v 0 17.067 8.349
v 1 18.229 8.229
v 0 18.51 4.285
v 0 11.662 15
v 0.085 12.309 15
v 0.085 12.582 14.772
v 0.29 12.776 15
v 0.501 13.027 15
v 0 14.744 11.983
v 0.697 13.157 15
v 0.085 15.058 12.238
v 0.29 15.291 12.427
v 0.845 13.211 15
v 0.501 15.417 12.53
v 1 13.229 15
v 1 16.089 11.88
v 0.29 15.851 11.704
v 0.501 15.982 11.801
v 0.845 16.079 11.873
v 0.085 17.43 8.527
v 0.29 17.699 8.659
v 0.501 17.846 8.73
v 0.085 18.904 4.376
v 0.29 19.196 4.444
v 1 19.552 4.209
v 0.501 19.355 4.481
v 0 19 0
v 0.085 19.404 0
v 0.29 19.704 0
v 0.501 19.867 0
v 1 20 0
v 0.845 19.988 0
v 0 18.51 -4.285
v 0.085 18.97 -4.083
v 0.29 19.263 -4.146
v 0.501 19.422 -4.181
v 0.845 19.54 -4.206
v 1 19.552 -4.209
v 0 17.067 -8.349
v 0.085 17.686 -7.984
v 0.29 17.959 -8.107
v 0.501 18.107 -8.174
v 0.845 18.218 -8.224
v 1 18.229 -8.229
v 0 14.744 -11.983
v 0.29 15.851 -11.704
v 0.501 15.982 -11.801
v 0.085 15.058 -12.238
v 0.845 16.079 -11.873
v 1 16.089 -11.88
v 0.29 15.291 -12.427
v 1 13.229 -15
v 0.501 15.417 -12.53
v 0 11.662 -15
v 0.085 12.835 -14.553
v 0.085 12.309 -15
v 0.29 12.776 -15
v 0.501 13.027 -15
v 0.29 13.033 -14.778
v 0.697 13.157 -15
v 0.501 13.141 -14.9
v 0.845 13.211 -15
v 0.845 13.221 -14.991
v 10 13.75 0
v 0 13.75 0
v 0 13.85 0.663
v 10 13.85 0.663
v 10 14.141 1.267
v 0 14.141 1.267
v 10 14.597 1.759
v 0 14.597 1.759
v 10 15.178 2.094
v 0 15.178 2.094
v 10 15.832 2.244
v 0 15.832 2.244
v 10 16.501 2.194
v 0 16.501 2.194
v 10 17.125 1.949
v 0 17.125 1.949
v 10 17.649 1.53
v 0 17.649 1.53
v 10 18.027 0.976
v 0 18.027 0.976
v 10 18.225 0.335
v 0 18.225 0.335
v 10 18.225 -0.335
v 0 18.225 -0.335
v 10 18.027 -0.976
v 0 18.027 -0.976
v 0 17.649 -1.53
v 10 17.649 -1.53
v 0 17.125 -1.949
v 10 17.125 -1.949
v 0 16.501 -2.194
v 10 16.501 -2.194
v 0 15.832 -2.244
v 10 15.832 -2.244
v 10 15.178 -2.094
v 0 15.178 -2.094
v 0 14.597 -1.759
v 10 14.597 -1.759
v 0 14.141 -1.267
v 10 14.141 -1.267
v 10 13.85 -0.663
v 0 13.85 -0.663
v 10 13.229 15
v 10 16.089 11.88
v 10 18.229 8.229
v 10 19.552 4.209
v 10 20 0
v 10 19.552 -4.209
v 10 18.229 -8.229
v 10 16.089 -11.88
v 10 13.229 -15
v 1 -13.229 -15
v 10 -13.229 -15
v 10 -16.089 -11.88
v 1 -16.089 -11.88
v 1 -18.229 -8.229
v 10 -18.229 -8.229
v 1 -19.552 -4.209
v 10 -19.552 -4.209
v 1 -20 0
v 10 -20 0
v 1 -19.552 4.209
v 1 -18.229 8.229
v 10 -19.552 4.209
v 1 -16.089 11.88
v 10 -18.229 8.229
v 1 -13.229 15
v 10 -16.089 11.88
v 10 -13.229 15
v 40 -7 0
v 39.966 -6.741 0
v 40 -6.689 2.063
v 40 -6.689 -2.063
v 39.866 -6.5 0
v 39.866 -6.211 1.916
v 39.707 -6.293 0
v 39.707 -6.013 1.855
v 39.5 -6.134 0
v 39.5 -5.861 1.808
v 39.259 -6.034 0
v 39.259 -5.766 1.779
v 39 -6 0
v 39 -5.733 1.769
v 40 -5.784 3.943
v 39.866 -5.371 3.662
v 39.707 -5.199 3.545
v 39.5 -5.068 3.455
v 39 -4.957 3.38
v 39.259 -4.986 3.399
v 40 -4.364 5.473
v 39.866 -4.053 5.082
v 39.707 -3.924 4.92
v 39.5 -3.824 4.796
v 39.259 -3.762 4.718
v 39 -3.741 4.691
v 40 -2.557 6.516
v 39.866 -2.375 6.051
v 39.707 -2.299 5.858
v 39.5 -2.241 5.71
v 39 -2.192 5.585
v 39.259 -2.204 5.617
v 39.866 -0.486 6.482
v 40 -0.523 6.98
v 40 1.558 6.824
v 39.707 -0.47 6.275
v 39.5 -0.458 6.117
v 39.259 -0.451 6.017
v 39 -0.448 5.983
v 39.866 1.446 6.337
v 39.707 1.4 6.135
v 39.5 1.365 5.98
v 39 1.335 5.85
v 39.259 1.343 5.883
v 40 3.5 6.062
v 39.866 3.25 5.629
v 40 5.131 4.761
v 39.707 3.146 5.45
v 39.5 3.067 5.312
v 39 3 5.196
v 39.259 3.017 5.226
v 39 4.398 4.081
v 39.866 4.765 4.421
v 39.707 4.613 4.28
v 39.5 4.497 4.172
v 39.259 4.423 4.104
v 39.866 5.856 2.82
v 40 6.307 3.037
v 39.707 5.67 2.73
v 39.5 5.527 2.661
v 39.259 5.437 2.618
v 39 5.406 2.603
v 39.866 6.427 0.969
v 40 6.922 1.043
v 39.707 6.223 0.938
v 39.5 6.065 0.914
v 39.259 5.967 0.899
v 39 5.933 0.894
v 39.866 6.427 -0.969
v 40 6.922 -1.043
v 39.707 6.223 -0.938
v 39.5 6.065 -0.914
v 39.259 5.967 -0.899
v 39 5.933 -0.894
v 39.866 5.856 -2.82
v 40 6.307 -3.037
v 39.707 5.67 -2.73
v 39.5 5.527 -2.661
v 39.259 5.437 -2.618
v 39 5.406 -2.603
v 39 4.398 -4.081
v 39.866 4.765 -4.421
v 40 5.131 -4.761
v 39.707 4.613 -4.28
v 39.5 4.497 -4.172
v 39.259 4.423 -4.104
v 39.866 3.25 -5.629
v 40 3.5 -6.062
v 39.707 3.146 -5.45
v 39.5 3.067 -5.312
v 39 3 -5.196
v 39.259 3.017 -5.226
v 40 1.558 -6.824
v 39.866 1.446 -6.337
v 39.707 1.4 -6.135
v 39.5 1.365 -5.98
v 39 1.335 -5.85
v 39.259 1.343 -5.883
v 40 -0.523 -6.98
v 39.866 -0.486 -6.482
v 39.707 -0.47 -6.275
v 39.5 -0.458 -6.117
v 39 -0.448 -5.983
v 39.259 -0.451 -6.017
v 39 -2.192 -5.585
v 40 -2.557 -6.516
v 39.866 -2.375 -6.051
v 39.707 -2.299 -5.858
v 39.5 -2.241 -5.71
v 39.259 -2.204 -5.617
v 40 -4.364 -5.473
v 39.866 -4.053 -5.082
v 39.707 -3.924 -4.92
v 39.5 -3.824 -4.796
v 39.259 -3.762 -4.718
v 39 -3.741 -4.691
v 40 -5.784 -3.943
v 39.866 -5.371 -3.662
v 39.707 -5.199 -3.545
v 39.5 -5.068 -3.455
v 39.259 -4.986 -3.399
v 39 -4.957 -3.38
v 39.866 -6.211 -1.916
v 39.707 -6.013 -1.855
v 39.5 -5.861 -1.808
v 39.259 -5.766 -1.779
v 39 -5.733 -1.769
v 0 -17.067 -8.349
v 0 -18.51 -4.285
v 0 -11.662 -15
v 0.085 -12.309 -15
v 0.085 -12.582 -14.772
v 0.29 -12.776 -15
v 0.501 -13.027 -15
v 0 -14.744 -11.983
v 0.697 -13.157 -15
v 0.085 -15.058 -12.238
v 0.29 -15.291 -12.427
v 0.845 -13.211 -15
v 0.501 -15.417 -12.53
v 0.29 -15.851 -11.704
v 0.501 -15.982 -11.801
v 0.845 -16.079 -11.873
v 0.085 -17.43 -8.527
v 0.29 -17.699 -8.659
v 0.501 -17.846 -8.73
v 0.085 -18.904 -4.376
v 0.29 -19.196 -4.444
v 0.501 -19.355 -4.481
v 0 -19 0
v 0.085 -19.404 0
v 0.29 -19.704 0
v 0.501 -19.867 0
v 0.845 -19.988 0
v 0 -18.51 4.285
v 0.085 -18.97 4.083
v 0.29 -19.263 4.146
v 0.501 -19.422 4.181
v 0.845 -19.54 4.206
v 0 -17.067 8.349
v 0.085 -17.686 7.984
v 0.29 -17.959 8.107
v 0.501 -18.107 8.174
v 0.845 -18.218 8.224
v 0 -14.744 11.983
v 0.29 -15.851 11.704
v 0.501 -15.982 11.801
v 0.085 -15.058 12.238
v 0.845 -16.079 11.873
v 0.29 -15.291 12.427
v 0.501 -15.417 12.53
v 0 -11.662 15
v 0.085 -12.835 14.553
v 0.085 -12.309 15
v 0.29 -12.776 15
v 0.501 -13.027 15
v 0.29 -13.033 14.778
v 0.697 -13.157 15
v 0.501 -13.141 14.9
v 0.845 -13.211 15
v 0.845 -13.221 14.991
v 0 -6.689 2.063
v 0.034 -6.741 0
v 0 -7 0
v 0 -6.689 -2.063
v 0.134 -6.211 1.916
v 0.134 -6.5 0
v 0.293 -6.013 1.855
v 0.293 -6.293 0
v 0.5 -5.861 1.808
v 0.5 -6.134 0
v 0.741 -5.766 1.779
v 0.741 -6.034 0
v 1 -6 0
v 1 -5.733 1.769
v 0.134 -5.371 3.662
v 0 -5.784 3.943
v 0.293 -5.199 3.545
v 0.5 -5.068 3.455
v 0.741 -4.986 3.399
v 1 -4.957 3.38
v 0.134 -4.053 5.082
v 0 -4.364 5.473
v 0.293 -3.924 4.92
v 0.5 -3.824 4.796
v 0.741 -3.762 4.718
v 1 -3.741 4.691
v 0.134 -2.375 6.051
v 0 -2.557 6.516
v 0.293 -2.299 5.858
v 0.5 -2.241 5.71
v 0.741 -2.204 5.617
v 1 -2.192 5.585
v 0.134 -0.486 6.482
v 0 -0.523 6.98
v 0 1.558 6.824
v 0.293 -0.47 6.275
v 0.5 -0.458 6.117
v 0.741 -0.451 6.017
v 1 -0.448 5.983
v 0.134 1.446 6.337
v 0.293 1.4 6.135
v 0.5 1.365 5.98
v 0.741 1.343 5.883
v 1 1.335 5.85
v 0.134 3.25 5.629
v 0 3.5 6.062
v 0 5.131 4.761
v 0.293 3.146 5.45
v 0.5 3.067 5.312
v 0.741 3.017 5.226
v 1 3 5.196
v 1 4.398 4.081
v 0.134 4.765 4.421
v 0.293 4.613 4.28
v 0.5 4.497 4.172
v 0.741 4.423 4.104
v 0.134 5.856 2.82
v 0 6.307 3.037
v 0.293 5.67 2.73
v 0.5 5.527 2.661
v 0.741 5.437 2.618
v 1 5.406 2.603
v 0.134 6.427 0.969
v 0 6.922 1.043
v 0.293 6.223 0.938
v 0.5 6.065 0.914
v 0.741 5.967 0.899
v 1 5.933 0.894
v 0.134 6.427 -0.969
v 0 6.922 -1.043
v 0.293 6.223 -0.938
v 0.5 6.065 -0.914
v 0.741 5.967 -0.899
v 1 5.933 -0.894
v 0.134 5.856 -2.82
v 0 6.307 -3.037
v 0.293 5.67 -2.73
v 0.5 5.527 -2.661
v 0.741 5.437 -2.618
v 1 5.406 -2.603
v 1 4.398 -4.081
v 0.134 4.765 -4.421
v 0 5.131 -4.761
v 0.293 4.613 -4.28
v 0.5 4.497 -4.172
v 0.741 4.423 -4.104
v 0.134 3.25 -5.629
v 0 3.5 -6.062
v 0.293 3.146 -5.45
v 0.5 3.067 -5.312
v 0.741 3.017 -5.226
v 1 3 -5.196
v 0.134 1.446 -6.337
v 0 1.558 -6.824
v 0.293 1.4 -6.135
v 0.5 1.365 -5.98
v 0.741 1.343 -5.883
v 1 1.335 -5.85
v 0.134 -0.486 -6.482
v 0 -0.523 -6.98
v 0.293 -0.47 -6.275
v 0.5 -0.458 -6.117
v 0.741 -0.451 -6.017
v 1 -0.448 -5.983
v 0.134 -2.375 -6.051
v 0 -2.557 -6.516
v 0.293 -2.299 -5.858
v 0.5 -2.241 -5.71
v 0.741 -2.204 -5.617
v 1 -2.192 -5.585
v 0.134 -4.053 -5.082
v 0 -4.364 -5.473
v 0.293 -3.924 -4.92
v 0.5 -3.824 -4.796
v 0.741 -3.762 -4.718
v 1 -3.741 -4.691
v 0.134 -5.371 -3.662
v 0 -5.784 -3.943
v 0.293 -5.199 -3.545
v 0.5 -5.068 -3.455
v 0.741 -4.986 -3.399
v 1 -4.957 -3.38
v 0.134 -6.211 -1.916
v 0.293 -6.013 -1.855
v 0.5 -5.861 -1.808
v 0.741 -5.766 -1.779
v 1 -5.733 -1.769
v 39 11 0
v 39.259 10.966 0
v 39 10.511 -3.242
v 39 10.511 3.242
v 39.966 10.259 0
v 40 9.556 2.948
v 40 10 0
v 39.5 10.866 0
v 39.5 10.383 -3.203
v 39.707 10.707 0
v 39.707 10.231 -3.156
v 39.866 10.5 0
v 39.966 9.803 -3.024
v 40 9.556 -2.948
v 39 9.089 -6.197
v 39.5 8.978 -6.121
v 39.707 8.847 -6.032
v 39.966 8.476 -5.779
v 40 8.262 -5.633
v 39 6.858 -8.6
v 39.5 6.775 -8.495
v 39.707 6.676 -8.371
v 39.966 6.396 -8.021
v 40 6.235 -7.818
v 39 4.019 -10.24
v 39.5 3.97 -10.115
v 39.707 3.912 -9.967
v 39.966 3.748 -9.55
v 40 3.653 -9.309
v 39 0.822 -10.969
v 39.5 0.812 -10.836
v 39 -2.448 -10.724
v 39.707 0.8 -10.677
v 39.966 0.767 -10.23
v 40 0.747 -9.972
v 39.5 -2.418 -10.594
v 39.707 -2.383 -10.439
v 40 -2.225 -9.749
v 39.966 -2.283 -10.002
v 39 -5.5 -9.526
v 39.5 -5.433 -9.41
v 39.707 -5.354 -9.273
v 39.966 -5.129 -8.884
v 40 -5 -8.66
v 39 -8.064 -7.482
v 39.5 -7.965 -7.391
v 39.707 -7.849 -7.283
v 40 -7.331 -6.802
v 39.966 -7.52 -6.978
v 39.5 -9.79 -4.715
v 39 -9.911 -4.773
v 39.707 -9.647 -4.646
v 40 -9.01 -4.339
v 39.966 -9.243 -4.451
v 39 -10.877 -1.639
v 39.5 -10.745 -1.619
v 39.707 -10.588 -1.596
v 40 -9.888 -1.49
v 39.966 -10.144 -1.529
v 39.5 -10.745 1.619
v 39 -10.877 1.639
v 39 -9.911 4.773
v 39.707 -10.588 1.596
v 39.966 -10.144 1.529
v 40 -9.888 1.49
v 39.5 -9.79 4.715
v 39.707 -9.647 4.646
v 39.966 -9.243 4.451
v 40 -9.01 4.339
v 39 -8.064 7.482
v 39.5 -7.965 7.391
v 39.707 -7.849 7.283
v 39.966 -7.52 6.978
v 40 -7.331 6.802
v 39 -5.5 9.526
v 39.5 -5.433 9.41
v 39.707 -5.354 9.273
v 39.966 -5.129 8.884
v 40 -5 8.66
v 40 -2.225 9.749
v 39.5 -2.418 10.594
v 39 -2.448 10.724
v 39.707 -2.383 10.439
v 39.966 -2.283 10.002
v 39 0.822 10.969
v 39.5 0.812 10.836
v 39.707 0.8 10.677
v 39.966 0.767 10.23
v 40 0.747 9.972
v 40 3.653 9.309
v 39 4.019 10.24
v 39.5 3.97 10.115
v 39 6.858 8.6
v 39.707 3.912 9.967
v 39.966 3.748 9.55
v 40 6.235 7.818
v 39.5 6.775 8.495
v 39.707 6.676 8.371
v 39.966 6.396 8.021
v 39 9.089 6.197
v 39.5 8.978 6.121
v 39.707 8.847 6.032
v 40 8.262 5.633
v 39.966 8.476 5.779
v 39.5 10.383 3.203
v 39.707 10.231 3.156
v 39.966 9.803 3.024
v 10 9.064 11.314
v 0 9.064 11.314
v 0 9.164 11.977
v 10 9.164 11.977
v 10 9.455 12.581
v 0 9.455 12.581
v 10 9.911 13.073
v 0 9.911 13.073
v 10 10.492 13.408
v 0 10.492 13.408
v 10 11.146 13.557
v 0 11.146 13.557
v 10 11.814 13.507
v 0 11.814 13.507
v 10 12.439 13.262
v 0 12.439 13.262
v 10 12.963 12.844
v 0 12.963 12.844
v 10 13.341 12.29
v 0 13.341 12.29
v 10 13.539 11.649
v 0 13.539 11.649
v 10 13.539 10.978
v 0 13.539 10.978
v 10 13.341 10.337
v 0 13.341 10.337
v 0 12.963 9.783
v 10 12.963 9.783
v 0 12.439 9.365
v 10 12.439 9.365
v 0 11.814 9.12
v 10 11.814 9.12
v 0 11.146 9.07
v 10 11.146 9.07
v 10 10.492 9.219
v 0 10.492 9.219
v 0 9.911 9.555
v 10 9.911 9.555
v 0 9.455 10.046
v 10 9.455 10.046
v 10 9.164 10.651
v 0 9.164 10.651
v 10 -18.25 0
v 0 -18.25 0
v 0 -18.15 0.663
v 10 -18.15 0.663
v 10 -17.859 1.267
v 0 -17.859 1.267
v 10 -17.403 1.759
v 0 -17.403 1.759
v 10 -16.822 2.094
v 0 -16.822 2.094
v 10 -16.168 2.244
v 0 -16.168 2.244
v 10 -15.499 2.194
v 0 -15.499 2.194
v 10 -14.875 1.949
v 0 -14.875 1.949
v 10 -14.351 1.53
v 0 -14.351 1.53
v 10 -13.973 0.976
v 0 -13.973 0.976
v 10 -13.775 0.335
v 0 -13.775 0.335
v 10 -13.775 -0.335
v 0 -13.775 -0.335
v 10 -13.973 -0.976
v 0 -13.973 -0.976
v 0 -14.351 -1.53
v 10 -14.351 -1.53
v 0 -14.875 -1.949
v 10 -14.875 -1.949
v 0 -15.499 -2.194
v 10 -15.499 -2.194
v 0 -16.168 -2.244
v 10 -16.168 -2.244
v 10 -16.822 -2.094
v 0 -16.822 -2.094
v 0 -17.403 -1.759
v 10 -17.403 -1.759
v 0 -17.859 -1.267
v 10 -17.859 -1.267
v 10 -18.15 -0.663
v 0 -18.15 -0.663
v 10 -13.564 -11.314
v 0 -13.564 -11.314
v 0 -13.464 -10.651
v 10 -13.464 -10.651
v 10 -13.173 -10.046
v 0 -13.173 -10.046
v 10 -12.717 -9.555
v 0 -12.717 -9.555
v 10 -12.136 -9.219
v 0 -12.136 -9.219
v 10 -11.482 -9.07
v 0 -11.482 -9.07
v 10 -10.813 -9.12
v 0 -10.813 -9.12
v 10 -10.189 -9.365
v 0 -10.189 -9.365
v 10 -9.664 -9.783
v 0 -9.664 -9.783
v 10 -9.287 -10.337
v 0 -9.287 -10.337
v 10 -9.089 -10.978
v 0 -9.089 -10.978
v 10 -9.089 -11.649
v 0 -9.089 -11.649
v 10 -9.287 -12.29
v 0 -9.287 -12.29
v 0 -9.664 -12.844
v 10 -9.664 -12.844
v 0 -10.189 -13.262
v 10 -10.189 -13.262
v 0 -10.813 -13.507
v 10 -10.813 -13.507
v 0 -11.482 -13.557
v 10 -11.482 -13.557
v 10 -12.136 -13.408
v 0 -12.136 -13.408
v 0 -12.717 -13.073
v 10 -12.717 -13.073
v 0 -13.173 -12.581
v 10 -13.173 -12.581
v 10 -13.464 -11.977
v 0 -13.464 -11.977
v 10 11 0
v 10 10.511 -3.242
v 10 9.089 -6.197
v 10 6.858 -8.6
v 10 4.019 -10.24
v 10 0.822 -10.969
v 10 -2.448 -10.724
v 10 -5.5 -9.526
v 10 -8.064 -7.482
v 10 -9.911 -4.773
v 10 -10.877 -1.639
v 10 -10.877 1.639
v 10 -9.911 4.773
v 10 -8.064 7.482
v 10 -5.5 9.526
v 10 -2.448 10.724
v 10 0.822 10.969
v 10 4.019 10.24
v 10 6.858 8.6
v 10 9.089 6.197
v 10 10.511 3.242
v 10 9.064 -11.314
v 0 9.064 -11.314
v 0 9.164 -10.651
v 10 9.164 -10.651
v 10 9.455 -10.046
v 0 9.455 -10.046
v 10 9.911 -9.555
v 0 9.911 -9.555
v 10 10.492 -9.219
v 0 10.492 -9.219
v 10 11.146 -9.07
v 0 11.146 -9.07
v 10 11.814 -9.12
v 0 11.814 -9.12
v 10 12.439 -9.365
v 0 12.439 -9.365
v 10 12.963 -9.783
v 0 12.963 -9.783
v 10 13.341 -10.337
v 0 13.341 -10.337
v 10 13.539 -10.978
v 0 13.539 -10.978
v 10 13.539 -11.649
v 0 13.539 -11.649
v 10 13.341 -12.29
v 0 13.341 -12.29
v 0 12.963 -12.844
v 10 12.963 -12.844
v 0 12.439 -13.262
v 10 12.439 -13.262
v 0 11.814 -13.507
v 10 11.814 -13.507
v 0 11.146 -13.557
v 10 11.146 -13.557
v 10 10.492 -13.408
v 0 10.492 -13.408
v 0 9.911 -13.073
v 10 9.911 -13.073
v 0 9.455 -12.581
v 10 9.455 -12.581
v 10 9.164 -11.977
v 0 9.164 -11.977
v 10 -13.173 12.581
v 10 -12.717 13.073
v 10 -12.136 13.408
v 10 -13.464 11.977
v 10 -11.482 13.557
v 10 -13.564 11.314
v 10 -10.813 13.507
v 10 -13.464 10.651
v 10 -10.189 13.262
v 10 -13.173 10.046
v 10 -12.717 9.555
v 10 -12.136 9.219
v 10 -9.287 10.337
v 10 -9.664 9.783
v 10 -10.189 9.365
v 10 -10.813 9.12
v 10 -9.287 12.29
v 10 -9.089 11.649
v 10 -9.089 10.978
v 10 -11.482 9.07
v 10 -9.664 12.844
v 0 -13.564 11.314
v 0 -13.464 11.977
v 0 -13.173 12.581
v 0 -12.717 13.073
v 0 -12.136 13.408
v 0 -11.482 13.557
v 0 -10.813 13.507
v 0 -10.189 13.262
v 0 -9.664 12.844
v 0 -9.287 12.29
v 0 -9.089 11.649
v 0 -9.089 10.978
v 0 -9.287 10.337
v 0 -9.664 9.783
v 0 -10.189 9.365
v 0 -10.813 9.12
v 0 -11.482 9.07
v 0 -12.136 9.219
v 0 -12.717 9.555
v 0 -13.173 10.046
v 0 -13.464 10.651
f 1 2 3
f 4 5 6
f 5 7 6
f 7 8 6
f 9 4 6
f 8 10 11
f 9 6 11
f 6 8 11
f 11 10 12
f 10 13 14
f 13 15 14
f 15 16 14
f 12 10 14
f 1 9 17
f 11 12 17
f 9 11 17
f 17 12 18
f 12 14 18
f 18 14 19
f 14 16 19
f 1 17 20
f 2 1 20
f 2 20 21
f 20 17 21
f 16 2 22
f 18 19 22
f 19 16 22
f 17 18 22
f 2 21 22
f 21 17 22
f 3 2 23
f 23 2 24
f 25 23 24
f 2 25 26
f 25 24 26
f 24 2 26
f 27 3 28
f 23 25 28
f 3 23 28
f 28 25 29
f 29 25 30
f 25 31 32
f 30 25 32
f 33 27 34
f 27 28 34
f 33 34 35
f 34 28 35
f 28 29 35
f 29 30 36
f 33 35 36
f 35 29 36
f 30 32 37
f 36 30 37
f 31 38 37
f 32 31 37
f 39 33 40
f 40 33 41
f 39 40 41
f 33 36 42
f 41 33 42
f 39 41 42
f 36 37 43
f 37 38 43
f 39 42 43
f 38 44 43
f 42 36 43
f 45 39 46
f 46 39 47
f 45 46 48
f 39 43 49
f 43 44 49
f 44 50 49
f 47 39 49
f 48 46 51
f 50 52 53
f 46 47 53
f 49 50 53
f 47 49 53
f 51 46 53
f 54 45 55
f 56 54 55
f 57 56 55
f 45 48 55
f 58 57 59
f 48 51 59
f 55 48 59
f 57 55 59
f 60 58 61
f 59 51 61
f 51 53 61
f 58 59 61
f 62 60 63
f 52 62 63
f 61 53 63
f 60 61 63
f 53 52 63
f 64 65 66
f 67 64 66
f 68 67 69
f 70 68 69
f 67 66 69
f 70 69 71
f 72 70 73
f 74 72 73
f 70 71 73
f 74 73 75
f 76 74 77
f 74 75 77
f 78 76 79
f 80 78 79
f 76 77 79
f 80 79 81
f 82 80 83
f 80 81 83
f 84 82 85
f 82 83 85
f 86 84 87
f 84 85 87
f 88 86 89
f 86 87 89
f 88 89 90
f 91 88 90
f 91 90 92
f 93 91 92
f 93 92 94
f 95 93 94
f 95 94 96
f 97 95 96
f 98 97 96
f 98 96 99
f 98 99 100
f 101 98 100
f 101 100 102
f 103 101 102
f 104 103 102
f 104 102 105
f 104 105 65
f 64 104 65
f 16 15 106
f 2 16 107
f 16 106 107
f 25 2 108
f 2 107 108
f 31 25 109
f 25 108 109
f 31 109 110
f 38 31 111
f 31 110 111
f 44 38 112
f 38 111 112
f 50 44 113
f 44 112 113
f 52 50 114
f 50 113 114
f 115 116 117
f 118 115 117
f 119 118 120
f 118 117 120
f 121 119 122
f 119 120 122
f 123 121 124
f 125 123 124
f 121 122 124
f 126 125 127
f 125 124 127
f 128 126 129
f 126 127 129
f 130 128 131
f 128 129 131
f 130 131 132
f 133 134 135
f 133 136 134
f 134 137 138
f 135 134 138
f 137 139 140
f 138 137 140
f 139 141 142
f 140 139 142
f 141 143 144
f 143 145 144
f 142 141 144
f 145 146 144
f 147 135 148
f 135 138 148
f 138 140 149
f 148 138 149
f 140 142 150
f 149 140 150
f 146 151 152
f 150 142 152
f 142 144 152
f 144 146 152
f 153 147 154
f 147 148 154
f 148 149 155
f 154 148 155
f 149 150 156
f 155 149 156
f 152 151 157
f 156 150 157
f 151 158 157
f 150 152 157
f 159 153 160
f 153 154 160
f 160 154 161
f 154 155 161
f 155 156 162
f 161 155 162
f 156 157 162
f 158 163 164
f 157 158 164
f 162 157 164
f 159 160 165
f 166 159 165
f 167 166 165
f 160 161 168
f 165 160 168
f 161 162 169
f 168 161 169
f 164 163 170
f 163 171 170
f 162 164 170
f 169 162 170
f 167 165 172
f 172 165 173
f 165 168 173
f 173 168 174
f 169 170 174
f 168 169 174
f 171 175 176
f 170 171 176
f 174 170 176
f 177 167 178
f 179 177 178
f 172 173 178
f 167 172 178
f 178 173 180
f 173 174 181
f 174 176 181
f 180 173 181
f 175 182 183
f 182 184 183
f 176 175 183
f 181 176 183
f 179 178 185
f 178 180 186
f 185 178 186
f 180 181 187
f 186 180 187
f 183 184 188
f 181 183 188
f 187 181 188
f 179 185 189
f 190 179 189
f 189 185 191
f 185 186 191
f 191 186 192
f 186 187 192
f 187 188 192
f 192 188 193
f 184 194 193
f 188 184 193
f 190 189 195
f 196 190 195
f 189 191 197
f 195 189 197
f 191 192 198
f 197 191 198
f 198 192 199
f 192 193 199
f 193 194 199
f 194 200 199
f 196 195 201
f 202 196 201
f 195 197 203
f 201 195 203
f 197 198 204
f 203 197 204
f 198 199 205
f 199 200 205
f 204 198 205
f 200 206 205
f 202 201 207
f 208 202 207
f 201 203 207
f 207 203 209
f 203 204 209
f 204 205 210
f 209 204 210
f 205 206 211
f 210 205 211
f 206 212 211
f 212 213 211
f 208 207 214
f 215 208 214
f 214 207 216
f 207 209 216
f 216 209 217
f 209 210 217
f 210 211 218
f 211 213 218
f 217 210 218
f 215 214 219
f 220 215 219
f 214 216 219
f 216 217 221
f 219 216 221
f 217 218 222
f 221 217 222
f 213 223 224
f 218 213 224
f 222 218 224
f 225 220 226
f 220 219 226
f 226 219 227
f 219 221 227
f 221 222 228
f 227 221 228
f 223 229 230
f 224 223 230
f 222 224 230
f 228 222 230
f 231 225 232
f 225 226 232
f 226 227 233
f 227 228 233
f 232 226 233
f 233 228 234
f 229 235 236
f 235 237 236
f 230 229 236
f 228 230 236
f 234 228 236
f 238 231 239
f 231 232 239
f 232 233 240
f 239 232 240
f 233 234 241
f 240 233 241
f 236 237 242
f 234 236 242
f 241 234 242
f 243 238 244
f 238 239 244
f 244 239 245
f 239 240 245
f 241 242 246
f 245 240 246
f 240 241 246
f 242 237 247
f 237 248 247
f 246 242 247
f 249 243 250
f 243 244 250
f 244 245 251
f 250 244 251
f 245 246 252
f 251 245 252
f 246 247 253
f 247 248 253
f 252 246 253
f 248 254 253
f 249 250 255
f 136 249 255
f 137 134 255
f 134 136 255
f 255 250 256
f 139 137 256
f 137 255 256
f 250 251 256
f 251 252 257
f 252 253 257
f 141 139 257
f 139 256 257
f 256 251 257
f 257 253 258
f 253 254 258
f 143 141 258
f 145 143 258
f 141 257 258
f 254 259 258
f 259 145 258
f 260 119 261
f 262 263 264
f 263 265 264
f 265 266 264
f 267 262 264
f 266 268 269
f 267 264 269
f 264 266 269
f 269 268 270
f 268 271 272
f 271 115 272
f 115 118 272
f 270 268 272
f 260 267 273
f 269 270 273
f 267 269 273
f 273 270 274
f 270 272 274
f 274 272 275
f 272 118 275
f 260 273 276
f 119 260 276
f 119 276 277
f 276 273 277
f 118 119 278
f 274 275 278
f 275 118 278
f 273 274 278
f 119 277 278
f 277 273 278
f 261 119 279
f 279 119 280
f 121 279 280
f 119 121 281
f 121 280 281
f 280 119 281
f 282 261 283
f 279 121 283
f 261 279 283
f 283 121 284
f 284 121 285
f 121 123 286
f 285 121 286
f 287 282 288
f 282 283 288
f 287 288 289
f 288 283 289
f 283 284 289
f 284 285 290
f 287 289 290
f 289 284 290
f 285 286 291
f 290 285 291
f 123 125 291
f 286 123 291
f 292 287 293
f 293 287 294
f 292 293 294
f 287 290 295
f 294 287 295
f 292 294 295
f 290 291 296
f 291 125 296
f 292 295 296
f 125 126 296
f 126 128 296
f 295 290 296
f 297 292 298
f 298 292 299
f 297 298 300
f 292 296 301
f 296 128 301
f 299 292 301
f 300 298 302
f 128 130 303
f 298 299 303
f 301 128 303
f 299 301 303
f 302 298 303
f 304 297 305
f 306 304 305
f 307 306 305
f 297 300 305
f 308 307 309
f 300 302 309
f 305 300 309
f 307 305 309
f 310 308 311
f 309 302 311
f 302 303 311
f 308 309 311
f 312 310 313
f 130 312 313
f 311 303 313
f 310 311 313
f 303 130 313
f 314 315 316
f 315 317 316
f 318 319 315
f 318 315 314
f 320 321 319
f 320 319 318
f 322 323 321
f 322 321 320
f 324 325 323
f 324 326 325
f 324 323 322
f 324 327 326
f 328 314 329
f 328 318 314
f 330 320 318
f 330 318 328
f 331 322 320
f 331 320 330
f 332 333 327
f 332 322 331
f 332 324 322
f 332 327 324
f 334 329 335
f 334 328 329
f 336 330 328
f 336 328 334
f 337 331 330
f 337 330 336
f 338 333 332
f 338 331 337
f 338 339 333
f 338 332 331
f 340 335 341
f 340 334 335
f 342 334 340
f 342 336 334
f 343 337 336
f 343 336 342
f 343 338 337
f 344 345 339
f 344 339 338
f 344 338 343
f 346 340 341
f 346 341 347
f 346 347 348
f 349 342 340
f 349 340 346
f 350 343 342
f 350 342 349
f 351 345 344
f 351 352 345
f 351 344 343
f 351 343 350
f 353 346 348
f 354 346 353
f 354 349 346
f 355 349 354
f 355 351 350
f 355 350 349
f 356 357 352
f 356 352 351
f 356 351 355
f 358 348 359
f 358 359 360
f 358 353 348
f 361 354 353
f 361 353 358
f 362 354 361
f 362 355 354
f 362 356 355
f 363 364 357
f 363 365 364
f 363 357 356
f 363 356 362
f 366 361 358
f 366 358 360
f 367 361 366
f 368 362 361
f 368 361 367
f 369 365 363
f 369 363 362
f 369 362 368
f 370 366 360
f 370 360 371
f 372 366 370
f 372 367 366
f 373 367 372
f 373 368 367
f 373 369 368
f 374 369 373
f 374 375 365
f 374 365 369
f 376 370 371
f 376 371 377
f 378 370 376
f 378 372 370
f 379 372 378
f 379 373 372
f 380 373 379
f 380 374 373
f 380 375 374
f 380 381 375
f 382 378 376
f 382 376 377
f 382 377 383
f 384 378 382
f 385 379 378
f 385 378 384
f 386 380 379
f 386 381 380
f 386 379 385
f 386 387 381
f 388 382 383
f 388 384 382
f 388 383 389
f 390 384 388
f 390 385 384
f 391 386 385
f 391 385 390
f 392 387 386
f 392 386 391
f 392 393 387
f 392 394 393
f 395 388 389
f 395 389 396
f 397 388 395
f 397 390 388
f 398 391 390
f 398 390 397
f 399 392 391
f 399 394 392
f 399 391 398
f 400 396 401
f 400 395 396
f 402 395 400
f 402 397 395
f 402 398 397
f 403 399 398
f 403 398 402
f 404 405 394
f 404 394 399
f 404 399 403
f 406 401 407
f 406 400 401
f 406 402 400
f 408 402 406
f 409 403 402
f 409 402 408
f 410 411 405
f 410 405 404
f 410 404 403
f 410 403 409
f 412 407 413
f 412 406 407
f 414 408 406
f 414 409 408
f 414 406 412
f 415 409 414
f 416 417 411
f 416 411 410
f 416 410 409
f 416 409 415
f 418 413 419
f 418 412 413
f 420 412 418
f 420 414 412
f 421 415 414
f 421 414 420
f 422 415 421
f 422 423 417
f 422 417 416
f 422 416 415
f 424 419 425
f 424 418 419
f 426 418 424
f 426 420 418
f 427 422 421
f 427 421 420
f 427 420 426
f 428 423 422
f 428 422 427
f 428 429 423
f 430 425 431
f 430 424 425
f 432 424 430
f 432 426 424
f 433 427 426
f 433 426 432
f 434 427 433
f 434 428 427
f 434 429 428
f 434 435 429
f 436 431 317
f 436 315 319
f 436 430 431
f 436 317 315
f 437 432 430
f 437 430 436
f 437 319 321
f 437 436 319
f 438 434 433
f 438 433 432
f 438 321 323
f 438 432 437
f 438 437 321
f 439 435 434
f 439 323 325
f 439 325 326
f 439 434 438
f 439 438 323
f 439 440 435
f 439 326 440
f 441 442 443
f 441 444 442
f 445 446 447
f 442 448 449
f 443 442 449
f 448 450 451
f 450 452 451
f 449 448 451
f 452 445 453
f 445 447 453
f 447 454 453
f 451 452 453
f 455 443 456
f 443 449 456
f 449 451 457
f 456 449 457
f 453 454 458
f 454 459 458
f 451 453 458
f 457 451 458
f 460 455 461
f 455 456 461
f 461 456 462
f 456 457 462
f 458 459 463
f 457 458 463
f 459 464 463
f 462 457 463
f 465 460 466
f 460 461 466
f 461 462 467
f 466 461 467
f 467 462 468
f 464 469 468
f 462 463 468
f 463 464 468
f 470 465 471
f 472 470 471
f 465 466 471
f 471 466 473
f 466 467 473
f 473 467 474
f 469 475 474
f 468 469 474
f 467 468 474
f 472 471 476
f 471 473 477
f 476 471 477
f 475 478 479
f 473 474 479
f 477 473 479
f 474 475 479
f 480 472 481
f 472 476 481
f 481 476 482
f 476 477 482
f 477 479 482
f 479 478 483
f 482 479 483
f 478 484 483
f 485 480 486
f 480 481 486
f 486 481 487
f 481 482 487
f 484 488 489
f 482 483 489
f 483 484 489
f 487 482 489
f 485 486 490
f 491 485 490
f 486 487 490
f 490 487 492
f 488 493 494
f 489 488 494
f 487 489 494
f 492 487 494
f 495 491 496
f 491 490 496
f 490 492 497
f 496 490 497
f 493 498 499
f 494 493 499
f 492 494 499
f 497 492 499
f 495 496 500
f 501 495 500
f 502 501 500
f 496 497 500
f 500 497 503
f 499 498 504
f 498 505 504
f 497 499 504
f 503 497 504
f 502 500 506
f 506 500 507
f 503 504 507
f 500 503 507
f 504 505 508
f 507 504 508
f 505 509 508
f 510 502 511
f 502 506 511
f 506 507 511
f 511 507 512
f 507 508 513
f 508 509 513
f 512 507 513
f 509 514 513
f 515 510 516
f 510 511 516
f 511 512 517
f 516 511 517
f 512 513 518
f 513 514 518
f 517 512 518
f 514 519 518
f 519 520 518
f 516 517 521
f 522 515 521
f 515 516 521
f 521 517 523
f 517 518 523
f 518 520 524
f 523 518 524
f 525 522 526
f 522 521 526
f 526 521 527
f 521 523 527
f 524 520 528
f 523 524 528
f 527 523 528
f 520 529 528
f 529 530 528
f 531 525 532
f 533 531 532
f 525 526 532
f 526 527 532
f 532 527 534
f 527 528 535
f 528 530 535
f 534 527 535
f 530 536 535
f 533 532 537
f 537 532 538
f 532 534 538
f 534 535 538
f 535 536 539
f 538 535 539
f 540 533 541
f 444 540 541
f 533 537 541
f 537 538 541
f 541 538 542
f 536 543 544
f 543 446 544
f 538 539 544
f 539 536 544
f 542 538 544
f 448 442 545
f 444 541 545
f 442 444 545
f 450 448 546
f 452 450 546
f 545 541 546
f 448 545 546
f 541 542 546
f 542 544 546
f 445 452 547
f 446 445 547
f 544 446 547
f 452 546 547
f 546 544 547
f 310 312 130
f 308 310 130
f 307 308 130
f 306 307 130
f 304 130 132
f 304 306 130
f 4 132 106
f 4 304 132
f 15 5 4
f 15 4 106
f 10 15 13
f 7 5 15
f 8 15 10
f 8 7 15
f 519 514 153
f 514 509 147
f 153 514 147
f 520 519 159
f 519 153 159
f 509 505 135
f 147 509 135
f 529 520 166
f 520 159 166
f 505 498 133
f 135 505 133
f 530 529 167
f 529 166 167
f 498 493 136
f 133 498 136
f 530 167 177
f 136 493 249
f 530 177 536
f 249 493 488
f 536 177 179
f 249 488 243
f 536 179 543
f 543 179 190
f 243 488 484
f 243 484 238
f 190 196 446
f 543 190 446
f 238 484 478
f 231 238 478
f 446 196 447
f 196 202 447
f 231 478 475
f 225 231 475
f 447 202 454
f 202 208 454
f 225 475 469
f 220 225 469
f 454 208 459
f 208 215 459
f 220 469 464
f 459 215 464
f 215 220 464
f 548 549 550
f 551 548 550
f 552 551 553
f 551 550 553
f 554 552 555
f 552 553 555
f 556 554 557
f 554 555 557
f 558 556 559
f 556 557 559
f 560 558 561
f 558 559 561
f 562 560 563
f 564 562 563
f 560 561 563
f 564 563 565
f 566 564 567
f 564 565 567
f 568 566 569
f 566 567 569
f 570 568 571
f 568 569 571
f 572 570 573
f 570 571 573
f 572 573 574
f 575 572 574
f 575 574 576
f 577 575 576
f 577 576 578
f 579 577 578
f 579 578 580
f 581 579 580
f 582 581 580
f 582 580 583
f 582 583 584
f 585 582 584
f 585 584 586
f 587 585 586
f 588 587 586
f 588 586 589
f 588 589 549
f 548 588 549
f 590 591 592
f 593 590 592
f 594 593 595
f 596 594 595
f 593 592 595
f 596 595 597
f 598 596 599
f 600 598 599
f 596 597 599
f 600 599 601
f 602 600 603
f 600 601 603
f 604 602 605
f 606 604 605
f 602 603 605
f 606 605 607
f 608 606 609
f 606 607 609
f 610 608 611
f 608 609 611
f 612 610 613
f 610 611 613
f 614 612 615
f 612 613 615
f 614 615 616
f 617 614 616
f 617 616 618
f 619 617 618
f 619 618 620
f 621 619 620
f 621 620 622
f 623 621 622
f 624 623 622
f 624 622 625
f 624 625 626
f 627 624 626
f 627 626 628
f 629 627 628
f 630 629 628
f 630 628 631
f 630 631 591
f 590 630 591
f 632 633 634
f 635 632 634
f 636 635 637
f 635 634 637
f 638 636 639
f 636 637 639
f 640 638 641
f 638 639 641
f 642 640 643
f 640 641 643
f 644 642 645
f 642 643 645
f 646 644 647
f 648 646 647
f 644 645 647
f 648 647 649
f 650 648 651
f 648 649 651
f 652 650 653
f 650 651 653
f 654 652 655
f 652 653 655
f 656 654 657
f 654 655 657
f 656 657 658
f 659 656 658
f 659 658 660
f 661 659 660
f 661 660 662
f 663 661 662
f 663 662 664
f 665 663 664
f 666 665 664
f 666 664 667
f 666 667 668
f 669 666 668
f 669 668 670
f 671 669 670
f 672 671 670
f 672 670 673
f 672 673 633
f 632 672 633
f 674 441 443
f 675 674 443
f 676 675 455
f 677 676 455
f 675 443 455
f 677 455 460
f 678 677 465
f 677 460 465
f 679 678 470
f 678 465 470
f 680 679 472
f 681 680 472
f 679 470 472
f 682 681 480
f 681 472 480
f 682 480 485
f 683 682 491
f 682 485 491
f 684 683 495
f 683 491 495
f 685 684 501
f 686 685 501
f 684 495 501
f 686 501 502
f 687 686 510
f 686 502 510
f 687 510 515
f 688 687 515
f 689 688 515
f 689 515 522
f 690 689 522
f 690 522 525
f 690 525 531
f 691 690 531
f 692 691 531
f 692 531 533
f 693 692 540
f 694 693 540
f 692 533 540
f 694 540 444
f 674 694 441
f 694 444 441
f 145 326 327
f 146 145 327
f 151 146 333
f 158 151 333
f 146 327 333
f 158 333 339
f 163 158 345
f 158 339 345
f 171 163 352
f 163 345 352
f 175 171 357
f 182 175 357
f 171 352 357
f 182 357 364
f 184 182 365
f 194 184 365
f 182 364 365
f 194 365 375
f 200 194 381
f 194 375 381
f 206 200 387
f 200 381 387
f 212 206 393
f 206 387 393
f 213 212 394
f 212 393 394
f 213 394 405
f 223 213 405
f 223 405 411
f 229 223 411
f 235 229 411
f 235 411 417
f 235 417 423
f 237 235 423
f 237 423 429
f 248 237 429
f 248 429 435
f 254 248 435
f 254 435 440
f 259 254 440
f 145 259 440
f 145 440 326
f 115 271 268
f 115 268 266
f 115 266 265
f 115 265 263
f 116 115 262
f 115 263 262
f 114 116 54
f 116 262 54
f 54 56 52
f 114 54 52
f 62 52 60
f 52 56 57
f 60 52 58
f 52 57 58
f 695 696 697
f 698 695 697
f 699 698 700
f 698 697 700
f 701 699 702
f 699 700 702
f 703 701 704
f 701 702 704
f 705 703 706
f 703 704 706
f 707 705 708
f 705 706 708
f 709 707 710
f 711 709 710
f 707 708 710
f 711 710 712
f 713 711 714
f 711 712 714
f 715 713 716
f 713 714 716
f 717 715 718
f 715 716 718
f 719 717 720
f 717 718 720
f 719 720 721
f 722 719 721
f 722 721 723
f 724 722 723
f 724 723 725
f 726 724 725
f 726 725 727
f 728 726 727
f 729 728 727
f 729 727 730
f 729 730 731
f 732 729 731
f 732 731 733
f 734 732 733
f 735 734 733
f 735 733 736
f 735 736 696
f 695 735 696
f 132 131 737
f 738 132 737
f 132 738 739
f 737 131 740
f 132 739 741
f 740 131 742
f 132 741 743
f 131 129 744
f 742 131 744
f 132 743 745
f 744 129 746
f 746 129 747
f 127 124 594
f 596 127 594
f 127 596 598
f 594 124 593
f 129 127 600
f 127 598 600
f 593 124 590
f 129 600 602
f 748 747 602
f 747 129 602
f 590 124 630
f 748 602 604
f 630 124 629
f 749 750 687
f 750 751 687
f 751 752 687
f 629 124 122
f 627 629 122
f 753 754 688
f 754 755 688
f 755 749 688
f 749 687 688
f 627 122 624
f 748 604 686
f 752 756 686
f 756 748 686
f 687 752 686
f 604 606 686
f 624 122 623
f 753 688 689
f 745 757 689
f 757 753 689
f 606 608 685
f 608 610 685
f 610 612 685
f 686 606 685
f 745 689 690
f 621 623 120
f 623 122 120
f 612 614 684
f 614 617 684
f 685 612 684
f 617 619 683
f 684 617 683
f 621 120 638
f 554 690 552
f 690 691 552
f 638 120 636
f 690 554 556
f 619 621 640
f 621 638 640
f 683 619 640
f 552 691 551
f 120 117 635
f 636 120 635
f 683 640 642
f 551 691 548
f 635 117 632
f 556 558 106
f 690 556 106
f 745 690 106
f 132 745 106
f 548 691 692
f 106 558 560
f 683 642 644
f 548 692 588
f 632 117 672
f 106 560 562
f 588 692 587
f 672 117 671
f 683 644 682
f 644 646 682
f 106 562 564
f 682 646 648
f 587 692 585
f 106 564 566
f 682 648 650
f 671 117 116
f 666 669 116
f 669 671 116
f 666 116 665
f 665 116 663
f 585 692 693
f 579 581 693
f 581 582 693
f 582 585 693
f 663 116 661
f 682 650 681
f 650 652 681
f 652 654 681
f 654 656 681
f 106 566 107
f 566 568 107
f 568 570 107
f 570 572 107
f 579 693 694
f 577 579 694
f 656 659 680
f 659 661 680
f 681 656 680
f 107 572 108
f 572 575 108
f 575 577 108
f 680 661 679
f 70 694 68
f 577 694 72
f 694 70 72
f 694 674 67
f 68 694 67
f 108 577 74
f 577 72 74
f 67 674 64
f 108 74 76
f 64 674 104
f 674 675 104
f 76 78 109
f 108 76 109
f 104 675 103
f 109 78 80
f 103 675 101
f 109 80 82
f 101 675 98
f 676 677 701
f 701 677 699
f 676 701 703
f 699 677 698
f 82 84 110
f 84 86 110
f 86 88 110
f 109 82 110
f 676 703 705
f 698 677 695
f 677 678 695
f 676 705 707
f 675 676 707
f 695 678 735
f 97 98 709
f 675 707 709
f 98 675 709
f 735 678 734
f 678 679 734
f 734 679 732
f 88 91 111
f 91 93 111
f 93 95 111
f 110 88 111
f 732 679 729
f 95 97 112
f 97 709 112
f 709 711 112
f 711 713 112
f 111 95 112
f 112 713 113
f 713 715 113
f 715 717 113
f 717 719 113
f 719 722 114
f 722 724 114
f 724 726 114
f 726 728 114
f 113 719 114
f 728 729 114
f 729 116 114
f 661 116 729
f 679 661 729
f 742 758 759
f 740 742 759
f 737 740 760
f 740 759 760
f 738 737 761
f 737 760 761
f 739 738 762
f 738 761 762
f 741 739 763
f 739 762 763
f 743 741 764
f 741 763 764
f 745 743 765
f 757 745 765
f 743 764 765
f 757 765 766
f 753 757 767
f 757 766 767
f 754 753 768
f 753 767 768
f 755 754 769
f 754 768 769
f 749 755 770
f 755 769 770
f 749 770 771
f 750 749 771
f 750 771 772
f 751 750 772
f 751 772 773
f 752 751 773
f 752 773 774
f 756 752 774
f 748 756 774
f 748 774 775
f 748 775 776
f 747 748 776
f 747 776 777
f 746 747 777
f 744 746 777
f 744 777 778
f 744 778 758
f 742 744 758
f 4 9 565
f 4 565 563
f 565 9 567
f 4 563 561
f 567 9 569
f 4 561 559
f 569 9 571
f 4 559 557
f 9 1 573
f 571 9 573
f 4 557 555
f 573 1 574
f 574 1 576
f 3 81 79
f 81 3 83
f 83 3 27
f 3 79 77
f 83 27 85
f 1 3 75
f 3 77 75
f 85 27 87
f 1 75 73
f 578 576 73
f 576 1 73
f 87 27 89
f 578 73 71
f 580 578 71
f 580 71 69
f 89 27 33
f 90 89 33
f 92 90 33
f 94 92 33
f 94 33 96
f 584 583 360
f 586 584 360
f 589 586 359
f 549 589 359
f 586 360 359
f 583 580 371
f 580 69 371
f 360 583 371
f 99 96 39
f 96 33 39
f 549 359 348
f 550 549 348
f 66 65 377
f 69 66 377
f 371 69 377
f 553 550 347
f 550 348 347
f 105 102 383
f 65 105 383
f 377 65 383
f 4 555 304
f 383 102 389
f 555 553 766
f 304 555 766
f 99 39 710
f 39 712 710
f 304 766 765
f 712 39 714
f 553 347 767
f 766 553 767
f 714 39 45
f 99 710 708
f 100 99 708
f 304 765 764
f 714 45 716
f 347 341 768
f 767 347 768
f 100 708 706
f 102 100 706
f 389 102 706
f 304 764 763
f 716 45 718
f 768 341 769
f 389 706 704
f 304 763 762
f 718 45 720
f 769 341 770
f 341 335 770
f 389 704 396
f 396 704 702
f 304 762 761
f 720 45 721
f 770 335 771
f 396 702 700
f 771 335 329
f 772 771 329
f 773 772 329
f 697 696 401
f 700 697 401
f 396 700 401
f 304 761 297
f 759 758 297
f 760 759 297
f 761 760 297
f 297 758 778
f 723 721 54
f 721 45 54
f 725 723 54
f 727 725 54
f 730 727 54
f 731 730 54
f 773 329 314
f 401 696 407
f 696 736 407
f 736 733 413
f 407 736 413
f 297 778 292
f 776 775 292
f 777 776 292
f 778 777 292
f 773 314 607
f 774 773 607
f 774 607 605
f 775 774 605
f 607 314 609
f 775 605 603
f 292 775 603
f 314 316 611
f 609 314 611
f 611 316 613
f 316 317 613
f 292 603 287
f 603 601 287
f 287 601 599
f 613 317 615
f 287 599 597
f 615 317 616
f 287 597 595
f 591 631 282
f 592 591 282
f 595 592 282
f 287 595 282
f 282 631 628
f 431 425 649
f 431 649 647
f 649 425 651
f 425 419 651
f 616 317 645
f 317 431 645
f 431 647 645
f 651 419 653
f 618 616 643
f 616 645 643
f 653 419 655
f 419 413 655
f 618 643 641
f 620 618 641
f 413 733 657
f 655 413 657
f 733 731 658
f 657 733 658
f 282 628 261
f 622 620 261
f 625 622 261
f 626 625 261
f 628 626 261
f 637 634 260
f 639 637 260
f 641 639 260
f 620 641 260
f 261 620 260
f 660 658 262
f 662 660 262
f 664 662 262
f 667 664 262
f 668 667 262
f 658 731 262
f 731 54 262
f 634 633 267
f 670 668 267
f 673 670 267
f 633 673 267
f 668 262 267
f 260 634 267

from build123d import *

# Parameters (mm, degrees)
SKETCH_2_R           = 6
CUT_EXTRUDE_1_DEPTH  = 49.989794856
SKETCH_3_R           = 2.25
CUT_EXTRUDE_2_DEPTH  = 49.989794856
SKETCH_4_OUTSIDE_W   = 55.856
SKETCH_4_OUTSIDE_H   = 55.856
SKETCH_4_OUTSIDE_W_2 = 30
SKETCH_4_OUTSIDE_H_2 = 50.828583192
CUT_EXTRUDE_3_DEPTH  = 10
FILLET_1_R           = 1


with BuildPart() as part:
    # 草图1 → 旋转1 (revolve)
    with BuildSketch(Plane.XY):
        Polygon((0, 0), (0, 20), (10, 20), (10, 11), (40, 11), (40, 0), align=None)
    revolve(axis=Axis((40, 0, 0), (-1, 0, 0)))

    # 草图2 → 切除-拉伸1 (cut, through all)
    with BuildSketch(Plane.ZY):
        with Locations(Location((0, 0, 0), (0, 0, 270))):
            Circle(SKETCH_2_R)
    extrude(amount=-CUT_EXTRUDE_1_DEPTH, mode=Mode.SUBTRACT)

    # 草图3 → 切除-拉伸2 (cut, through all)
    with BuildSketch(Plane.ZY):
        with Locations(Location((0, 16, 0), (0, 0, 270))):
            Circle(SKETCH_3_R)
        with Locations(Location((11.313708499, 11.313708499, 0), (0, 0, 270))):
            Circle(SKETCH_3_R)
        with Locations(Location((11.313708499, -11.313708499, 0), (0, 0, 270))):
            Circle(SKETCH_3_R)
        with Locations(Location((0, -16, 0), (0, 0, 270))):
            Circle(SKETCH_3_R)
        with Locations(Location((-11.313708499, -11.313708499, 0), (0, 0, 270))):
            Circle(SKETCH_3_R)
        with Locations(Location((-11.313708499, 11.313708499, 0), (0, 0, 270))):
            Circle(SKETCH_3_R)
    extrude(amount=-CUT_EXTRUDE_2_DEPTH, mode=Mode.SUBTRACT)

    # 草图4 outside → 切除-拉伸3 (cut)
    with BuildSketch(Plane.ZY):
        Rectangle(SKETCH_4_OUTSIDE_W, SKETCH_4_OUTSIDE_H)
        Rectangle(SKETCH_4_OUTSIDE_W_2, SKETCH_4_OUTSIDE_H_2, mode=Mode.SUBTRACT)
    extrude(amount=-CUT_EXTRUDE_3_DEPTH, mode=Mode.SUBTRACT)

    # 圆角1
    fillet_1_edges = [part.edges().sort_by_distance(p)[0] for p in [
        (40, 6, 0),
        (0, 6, 0),
        (0, -20, 0),
        (0, 20, 0),
        (40, -11, 0),
    ]]
    fillet(fillet_1_edges, radius=FILLET_1_R)


solid = part.part
